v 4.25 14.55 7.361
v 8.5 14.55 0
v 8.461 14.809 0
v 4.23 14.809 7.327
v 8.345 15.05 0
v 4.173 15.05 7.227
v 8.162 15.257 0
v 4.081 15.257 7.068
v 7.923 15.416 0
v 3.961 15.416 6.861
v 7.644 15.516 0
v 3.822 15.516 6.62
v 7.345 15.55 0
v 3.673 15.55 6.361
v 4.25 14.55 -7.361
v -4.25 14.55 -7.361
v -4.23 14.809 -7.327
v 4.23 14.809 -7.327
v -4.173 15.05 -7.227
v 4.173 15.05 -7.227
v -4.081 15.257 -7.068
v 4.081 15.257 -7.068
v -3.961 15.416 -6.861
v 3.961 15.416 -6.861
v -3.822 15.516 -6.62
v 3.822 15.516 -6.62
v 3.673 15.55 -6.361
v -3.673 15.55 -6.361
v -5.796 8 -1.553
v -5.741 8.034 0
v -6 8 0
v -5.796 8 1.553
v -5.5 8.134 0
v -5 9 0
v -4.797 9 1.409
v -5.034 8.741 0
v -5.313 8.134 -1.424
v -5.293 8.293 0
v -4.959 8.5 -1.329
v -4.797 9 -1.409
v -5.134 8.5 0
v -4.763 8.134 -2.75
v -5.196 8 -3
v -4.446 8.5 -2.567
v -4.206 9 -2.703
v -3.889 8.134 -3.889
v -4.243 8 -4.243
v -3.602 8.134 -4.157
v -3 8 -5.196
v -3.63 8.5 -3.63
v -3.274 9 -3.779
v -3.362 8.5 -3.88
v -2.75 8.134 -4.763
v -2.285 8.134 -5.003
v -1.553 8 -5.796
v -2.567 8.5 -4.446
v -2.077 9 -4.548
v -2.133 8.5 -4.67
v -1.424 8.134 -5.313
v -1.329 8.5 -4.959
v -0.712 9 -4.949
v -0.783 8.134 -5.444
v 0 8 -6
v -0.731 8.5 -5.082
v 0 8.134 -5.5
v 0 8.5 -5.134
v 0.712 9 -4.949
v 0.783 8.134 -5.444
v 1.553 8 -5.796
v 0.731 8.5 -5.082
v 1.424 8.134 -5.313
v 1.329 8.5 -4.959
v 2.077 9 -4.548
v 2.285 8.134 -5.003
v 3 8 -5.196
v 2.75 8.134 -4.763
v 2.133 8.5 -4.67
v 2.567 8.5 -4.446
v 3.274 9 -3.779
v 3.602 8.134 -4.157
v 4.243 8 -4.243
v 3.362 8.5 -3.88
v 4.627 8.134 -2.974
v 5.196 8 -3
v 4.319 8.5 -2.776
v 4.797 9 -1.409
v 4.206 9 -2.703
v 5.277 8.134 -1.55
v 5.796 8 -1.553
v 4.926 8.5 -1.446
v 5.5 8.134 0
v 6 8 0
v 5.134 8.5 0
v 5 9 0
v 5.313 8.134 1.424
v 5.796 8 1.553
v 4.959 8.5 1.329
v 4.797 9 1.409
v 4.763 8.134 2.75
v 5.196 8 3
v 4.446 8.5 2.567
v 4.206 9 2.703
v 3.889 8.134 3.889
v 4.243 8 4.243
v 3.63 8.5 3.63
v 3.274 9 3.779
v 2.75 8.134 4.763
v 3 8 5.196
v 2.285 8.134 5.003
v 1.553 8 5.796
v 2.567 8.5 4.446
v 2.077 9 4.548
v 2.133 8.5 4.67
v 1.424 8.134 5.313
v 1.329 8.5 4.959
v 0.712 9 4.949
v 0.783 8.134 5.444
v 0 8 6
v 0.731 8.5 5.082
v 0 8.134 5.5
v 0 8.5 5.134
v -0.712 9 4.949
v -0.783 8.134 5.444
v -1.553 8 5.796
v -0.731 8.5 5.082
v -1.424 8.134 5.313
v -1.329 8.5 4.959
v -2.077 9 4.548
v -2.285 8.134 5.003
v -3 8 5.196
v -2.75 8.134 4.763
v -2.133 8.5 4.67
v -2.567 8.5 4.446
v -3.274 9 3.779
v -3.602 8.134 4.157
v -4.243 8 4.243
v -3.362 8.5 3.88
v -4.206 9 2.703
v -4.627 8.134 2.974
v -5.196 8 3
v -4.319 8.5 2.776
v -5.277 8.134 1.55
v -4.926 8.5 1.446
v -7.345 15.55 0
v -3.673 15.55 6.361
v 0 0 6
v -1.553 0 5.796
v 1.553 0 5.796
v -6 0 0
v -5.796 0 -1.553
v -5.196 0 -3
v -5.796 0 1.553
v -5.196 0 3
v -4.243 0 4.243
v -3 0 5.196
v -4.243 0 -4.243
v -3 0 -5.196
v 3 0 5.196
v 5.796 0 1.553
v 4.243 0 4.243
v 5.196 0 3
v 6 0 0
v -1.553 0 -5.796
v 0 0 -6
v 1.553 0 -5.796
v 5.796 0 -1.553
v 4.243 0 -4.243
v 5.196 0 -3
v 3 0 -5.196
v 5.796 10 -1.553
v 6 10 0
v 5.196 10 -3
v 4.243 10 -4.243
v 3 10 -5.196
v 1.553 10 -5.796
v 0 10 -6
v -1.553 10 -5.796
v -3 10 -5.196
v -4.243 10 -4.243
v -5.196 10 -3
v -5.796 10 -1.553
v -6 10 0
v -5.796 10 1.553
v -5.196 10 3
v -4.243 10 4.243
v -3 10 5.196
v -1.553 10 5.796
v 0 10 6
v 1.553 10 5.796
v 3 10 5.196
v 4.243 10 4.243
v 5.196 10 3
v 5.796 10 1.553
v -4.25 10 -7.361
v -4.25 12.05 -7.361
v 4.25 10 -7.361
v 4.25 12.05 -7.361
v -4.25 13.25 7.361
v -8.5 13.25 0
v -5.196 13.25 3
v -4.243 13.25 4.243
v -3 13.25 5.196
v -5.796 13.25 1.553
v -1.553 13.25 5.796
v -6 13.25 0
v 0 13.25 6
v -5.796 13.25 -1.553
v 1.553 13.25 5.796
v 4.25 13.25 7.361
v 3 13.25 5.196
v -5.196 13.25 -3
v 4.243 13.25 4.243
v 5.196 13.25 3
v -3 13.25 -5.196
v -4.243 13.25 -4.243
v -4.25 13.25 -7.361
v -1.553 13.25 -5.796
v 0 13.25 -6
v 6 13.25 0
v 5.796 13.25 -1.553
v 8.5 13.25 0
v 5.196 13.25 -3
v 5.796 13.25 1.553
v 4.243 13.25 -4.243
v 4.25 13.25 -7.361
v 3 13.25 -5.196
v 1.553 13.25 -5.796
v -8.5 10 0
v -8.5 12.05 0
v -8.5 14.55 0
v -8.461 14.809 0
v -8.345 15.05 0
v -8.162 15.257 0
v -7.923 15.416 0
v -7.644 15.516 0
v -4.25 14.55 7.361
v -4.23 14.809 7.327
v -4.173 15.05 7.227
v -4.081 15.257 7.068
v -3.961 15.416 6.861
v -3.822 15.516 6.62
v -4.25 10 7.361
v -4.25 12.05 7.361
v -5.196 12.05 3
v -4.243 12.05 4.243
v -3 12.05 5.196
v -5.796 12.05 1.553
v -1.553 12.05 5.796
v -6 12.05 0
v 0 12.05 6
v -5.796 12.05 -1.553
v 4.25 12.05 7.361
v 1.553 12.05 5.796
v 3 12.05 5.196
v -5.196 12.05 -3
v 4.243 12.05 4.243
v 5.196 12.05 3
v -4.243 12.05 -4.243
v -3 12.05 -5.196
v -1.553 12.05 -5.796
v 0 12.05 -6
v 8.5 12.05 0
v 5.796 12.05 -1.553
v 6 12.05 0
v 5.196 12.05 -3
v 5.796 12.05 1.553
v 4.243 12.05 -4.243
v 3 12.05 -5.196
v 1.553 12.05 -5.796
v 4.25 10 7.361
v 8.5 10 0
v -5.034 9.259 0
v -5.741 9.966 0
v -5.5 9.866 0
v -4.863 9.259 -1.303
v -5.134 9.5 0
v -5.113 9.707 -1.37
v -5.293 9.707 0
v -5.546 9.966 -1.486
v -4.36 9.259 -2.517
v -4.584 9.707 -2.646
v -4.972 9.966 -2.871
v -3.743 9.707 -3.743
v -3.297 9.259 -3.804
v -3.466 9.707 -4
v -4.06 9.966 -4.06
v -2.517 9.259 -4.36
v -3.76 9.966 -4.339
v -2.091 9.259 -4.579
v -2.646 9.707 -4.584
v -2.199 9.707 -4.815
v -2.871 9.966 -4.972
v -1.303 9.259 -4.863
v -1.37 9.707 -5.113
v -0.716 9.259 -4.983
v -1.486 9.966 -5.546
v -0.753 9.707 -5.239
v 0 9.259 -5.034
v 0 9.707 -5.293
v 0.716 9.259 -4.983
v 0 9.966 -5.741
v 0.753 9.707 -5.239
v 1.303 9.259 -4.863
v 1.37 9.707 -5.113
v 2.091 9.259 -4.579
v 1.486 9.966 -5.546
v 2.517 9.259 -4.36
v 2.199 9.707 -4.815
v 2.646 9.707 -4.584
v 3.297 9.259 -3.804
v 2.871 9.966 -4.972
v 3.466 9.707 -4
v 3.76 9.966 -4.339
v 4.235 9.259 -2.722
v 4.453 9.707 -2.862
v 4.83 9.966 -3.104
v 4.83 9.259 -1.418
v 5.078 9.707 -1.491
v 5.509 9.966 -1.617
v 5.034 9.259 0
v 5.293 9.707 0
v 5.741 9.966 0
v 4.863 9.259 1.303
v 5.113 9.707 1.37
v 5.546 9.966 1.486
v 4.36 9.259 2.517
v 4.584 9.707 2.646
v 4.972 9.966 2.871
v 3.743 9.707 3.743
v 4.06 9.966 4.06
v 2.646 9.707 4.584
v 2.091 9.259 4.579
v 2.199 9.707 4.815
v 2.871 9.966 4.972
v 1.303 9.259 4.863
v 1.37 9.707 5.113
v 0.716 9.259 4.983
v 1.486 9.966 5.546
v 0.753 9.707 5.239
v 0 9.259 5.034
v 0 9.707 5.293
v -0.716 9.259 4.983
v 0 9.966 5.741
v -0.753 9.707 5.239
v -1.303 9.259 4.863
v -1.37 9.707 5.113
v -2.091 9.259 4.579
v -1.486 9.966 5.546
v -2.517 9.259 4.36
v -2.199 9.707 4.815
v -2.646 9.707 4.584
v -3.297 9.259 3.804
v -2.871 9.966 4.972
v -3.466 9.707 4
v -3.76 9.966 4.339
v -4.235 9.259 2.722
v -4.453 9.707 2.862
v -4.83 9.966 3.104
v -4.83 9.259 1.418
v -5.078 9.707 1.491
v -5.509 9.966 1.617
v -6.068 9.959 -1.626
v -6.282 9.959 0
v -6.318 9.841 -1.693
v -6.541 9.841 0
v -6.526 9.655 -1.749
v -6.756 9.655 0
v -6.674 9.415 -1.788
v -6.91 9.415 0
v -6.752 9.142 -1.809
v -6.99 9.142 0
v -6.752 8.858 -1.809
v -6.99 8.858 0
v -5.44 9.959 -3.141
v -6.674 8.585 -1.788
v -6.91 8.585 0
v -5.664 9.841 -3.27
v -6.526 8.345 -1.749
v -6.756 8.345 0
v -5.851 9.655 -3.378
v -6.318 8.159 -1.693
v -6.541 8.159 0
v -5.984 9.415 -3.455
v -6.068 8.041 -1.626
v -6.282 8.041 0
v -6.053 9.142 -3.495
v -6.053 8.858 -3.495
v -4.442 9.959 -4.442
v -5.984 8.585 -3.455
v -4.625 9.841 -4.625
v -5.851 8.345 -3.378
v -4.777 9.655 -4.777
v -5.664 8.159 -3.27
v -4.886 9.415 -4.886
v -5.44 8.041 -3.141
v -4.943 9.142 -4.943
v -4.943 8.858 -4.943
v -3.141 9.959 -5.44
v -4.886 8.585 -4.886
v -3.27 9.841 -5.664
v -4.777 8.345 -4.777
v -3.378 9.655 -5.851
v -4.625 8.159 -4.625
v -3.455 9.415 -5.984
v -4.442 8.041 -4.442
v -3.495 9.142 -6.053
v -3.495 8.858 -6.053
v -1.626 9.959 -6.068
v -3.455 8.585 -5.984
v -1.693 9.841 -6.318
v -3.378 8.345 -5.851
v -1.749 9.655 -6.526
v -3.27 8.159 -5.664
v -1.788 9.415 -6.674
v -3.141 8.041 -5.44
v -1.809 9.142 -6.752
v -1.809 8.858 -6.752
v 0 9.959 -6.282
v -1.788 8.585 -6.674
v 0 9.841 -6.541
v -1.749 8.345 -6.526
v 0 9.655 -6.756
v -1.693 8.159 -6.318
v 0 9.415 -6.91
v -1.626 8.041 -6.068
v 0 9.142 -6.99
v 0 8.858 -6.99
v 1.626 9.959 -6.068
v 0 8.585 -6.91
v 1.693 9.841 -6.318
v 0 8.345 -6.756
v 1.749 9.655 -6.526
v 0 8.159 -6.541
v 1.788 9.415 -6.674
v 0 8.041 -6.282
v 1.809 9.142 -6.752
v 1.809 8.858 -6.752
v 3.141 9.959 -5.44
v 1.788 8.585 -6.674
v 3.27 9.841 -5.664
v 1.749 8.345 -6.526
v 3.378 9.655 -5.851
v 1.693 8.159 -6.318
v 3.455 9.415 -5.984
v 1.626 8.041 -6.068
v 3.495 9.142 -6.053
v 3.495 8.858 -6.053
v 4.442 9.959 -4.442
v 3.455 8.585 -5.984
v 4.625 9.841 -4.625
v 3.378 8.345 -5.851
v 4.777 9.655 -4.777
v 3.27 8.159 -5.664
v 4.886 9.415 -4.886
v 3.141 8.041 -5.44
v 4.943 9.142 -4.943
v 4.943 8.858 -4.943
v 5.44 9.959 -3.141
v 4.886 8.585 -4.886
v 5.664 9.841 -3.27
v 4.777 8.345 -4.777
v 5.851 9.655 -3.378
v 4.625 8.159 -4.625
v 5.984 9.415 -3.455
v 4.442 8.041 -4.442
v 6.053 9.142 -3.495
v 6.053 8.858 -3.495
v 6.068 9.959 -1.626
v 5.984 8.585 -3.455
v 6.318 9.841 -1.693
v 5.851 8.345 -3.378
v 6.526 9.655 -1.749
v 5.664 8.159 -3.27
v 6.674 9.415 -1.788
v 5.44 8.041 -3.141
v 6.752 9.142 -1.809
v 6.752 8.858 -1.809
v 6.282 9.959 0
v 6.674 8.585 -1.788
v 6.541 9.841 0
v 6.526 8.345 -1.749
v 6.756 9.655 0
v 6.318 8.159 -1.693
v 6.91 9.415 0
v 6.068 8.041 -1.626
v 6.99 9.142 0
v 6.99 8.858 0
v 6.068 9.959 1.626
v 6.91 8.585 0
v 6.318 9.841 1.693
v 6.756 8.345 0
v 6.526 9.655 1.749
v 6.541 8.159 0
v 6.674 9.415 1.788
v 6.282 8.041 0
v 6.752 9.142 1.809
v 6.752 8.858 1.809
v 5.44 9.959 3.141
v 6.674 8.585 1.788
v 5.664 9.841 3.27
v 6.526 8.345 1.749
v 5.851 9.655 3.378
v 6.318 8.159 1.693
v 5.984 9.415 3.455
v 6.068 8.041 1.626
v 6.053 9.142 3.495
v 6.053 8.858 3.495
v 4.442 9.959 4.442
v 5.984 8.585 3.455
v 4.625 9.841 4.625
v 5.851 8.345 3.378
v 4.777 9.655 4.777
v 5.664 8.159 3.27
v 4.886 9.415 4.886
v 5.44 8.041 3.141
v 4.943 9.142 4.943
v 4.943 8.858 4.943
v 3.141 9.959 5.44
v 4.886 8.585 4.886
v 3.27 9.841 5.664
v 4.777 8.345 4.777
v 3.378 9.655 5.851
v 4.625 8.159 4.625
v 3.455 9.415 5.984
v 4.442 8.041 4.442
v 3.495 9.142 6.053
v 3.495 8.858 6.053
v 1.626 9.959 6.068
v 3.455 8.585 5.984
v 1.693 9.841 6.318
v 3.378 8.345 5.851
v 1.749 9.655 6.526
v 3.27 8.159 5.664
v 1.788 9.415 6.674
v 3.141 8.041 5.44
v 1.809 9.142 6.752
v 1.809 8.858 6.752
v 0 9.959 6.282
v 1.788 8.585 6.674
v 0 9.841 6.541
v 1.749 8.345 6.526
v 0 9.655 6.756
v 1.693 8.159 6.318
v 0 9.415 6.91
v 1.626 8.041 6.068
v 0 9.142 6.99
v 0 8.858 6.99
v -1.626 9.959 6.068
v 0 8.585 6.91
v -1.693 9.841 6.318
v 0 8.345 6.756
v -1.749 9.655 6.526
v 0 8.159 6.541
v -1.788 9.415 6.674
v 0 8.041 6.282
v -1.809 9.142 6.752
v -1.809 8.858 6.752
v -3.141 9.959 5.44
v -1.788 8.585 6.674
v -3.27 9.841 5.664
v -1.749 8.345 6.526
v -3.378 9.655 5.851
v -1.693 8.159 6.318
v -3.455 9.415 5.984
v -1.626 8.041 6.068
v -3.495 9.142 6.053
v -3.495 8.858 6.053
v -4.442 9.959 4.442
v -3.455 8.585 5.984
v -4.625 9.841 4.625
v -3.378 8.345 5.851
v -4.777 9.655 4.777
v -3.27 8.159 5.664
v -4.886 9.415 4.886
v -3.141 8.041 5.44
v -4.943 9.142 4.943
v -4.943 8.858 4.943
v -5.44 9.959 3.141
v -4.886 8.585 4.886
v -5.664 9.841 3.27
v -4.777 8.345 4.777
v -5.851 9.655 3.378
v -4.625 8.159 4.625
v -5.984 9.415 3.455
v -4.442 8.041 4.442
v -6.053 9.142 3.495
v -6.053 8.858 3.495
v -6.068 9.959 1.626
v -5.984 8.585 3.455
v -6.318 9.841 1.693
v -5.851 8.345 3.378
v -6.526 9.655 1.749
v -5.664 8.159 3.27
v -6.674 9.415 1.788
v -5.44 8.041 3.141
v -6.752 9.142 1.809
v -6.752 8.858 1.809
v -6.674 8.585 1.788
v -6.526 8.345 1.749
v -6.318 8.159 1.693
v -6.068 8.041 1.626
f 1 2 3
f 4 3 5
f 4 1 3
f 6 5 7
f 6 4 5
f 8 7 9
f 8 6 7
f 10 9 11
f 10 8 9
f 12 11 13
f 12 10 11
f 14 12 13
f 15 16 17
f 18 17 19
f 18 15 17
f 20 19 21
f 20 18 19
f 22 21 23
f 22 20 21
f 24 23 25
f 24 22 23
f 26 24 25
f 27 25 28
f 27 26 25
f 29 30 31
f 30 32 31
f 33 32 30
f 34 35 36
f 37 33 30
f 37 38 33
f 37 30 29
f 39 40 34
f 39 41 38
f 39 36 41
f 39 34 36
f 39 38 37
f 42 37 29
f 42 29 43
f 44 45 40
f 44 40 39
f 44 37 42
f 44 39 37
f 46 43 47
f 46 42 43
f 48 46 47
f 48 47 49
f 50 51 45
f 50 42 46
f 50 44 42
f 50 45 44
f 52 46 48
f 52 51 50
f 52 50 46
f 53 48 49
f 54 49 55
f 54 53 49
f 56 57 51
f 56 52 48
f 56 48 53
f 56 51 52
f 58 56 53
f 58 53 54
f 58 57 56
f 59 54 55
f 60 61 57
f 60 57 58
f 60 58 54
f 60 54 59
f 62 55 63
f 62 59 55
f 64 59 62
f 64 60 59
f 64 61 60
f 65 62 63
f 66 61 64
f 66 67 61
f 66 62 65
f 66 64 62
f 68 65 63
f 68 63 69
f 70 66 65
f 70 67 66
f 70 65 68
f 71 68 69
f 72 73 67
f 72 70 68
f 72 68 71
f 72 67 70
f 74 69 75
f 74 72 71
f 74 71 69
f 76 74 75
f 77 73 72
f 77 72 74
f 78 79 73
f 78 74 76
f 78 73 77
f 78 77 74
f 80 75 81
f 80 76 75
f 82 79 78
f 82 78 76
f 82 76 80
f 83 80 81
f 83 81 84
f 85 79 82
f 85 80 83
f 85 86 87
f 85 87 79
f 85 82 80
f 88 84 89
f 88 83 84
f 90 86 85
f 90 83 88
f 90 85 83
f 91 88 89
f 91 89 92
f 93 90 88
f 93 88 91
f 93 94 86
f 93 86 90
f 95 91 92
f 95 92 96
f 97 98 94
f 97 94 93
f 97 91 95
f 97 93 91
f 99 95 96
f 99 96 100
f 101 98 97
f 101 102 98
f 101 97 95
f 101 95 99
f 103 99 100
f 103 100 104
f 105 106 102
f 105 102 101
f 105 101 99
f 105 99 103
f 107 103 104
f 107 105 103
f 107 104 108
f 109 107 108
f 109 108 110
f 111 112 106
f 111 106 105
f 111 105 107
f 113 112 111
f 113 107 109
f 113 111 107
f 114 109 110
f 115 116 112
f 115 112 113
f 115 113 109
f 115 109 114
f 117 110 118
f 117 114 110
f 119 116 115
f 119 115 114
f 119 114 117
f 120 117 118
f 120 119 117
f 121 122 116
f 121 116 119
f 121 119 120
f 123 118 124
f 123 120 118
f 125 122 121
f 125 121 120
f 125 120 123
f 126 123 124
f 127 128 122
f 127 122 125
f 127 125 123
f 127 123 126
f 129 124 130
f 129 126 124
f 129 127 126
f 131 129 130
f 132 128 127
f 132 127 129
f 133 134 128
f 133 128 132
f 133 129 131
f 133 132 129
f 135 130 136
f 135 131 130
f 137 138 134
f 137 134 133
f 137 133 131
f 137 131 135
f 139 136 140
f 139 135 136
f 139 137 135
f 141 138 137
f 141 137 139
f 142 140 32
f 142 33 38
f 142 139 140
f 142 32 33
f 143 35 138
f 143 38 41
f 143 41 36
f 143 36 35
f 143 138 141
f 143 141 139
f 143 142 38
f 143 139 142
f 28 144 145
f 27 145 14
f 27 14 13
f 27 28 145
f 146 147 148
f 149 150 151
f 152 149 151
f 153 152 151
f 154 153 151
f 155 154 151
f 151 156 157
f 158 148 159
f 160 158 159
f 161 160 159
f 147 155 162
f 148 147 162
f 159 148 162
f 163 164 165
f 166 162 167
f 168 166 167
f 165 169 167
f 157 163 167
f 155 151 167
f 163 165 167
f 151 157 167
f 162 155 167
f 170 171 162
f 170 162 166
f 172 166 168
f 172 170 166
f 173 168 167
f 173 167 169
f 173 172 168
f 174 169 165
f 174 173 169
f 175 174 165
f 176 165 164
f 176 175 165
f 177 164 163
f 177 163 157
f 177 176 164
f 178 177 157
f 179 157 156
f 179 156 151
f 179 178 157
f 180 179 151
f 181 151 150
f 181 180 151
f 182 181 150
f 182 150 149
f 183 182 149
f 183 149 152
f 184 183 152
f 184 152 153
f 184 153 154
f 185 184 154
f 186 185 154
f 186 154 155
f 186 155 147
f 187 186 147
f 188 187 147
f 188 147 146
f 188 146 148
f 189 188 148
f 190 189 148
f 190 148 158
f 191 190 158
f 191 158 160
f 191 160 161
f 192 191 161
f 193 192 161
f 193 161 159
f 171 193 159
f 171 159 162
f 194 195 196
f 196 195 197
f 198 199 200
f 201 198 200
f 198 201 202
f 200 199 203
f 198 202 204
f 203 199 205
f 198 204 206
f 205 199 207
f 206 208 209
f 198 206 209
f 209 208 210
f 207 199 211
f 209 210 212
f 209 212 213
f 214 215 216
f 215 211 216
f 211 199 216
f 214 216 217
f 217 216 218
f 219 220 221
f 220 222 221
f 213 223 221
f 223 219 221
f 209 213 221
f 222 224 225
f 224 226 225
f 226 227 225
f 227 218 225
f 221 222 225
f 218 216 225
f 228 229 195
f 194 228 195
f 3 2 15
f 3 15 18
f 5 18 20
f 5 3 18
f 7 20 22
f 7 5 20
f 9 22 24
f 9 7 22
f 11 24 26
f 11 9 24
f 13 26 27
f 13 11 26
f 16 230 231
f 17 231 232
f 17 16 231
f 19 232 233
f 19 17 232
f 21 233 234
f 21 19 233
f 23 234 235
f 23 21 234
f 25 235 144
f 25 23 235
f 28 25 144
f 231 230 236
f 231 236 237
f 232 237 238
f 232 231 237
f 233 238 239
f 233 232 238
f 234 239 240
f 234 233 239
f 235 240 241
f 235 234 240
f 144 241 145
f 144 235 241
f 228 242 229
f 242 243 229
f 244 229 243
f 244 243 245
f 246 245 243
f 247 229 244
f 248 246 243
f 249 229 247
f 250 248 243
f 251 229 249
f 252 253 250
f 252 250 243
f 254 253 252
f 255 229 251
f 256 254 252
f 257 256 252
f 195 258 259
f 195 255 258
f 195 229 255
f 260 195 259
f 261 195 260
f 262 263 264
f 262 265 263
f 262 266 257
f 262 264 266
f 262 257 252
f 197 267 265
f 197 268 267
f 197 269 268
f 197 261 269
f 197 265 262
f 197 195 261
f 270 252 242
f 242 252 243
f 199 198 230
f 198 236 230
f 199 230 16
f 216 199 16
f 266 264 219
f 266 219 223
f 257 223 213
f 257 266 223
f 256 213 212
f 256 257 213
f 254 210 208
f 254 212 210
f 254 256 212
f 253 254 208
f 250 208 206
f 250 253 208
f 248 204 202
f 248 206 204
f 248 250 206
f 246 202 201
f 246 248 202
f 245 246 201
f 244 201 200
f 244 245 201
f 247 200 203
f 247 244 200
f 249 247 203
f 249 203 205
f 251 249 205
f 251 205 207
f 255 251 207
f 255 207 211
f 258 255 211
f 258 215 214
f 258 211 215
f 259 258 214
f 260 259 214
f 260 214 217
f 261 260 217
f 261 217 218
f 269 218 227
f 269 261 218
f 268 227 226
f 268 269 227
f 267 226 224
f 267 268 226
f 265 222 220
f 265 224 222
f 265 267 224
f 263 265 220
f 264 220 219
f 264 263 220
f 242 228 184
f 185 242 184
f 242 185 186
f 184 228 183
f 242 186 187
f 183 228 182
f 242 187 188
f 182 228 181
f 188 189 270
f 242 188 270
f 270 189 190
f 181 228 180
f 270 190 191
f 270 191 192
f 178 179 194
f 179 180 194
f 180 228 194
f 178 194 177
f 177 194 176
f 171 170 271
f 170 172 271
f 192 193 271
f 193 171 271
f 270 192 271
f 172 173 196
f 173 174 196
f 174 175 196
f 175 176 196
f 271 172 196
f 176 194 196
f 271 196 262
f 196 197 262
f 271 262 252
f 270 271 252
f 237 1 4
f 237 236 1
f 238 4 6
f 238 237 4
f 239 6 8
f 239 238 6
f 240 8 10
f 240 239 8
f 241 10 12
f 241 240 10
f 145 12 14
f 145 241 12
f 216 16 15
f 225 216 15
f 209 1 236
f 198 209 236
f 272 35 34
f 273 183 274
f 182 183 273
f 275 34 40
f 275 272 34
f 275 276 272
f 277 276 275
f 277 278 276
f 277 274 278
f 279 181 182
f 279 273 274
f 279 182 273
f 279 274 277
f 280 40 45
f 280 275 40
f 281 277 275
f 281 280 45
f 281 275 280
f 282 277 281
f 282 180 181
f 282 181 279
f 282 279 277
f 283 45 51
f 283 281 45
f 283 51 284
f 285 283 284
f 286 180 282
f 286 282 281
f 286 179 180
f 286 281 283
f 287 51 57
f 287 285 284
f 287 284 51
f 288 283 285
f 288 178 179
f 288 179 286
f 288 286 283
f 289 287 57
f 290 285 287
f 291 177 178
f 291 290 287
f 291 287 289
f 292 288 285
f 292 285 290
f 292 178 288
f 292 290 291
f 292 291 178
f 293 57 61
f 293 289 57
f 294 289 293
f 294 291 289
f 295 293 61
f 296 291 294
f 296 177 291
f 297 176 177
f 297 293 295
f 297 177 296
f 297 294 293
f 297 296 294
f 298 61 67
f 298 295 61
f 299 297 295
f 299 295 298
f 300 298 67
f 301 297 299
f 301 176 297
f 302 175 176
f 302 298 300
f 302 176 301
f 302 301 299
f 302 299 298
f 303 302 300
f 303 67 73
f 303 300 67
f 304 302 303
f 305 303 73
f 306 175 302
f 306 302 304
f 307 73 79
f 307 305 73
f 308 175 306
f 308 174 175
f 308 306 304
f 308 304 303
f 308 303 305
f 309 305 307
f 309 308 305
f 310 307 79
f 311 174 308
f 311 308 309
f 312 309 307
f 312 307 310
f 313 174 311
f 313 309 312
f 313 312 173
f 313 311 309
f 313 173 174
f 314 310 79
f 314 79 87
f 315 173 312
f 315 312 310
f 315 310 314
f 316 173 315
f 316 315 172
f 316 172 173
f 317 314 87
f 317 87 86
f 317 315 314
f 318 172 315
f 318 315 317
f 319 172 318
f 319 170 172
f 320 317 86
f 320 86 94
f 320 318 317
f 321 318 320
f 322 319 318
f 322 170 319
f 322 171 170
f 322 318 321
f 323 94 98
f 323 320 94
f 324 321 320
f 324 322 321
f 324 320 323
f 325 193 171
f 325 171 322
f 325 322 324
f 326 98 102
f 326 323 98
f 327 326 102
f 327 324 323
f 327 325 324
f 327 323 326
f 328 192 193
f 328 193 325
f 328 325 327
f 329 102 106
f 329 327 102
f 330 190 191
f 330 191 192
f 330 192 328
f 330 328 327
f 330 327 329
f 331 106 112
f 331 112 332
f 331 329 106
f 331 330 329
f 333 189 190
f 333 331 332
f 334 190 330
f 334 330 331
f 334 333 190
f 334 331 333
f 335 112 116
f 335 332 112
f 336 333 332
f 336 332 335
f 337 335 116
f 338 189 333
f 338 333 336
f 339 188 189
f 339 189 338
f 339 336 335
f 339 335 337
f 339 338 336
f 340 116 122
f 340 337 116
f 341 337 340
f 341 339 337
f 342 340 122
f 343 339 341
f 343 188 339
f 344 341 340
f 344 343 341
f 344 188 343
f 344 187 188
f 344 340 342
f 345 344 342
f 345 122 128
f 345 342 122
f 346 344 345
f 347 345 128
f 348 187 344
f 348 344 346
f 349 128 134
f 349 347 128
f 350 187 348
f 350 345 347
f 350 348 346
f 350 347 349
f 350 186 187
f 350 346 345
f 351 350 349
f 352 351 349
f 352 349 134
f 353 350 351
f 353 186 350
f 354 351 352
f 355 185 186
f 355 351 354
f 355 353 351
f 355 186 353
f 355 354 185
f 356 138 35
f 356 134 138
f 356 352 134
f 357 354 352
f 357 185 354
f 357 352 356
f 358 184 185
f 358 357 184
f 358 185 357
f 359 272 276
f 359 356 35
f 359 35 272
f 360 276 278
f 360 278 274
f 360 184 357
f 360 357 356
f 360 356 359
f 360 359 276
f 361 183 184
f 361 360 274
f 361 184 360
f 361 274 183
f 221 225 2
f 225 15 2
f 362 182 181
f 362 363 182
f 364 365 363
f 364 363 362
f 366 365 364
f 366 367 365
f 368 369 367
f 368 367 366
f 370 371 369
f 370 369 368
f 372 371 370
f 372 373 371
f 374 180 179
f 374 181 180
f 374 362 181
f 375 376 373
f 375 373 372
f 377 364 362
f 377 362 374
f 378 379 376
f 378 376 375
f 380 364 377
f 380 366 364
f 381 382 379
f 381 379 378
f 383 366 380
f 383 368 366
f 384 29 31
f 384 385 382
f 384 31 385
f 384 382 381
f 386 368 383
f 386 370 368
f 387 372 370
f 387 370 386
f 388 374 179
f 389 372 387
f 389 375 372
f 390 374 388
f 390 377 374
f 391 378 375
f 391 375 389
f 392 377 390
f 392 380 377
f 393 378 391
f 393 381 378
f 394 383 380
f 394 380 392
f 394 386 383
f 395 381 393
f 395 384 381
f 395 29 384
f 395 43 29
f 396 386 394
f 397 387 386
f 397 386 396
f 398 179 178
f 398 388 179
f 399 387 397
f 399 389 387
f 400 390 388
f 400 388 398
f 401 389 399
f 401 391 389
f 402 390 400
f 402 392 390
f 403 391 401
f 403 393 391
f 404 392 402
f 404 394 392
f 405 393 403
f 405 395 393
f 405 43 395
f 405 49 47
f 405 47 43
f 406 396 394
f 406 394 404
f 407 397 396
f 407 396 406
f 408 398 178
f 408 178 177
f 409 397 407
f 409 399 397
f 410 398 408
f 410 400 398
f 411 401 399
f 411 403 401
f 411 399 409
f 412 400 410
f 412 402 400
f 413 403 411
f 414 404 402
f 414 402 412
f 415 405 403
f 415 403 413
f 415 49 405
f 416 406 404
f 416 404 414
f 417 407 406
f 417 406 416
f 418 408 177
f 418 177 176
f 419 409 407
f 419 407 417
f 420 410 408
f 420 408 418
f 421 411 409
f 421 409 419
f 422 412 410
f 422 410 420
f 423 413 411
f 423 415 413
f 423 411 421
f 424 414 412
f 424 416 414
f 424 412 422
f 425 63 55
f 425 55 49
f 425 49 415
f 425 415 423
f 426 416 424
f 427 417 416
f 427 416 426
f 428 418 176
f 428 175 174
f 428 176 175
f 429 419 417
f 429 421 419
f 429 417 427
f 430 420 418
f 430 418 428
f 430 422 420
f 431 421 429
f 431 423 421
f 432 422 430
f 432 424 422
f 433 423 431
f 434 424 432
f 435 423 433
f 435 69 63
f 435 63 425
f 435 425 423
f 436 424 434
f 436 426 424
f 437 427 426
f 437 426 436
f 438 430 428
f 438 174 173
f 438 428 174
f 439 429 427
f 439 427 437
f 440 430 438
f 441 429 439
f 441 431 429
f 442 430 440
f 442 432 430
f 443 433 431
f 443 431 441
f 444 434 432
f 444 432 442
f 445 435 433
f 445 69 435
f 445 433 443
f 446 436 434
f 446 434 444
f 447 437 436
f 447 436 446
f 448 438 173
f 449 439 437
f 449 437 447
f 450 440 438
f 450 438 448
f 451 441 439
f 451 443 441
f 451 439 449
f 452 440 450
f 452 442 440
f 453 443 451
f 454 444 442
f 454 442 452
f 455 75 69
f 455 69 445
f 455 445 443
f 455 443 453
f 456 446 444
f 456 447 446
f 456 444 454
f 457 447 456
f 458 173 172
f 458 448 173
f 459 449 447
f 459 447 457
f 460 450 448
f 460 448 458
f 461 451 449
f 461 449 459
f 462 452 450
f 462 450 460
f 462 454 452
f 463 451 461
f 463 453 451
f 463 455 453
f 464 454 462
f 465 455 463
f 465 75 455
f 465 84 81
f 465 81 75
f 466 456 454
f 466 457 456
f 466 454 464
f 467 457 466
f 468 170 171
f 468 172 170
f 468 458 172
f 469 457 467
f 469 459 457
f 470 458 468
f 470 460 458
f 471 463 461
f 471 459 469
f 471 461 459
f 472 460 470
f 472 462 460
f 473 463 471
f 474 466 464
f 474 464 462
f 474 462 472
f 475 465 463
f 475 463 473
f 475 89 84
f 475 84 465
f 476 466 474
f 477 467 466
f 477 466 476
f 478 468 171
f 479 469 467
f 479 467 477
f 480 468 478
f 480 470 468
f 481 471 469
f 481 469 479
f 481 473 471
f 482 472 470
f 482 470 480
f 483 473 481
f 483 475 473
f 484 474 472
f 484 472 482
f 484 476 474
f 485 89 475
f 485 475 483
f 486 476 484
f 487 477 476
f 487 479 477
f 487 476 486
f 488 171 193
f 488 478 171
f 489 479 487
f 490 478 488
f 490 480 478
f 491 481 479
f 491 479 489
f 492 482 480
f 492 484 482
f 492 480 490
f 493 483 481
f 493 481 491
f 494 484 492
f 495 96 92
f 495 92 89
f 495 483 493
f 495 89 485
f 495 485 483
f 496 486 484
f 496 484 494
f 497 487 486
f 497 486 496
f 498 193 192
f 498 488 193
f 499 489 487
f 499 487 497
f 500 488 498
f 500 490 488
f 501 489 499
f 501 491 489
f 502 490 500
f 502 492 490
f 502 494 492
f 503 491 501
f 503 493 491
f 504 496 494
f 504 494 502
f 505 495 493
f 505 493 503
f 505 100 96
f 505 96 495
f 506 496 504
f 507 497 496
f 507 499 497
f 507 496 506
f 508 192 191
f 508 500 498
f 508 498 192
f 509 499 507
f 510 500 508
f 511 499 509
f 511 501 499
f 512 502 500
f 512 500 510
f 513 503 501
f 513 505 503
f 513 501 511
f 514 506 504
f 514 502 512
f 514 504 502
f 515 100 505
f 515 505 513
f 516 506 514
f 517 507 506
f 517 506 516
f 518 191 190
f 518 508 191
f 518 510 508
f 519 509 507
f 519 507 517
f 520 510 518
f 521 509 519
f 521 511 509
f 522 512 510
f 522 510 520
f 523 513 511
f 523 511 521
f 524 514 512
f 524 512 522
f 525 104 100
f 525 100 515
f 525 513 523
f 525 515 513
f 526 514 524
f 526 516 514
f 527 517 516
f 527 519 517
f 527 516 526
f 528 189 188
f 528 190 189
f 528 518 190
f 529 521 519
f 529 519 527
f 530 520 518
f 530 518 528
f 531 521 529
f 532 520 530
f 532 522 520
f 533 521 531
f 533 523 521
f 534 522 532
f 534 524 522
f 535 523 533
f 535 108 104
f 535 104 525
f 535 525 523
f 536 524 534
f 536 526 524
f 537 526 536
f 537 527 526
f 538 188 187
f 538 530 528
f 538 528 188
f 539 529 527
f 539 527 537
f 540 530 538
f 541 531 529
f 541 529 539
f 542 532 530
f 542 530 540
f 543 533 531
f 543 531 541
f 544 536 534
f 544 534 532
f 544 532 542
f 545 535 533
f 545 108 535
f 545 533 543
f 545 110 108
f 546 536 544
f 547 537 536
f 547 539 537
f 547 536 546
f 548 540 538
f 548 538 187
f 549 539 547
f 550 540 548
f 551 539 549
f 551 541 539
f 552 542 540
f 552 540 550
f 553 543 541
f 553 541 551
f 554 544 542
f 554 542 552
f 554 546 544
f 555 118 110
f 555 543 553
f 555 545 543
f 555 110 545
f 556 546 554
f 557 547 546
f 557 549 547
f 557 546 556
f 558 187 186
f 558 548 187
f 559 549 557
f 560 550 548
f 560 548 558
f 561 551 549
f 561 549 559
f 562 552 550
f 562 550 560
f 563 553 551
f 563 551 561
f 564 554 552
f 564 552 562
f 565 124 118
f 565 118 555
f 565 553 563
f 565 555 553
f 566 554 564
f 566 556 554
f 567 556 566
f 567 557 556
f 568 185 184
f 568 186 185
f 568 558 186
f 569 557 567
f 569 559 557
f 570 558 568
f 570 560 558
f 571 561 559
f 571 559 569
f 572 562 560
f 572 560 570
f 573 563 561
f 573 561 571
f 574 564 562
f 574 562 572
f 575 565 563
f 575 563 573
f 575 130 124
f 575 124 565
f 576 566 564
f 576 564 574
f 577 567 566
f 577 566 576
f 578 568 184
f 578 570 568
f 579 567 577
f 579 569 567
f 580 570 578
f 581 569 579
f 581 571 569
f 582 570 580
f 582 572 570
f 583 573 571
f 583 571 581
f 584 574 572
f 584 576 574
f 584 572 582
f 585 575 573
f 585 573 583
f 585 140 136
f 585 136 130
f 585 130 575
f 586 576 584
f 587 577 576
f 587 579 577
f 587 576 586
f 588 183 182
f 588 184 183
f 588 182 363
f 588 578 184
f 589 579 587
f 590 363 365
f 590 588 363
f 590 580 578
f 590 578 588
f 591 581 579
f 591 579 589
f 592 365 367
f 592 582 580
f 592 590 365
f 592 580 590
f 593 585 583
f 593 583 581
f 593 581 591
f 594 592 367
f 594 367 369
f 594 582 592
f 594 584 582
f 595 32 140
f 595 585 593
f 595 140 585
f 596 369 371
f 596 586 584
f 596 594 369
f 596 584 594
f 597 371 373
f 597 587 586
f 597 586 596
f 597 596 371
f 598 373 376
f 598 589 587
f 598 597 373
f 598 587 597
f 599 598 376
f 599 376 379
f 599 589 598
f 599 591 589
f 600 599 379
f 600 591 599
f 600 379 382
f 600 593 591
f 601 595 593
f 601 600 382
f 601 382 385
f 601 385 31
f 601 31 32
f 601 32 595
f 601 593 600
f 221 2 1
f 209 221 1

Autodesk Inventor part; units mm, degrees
ref_plane "YZ Plane" through (0, 0, 0) normal (1, 0, 0) x (0, 1, 0)
ref_plane "XZ Plane" through (0, 0, 0) normal (0, 1, 0) x (-1, 0, 0)
sketch "Sketch1" plane through (0, 0, 0) normal (0, 0, 1) x (1, 0, 0)
  line L0 (0, 0) -> (6, 0)
  line L1 (6, 0) -> (6, 10)
  line L2 (6, 10) -> (8.5, 10)
  line L3 (8.5, 10) -> (8.5, 15.55)
  line L4 (8.5, 15.55) -> (0, 15.55)
  line L5 (0, 15.55) -> (0, 0)
  line L6 (0, -3.11) -> (0, 18.66) projected
  dimension "d0" = 10
  dimension "d1" = 5.55
  dimension "d2" = 8.5
  dimension "d3" = 6
revolve "Revolution1" add sketch "Sketch1" angle 360 about axis through (0, -10, 0) along (0, 1, 0)
thread "Thread1" size "M12x1.5" class "6g" standard "ANSI Metric M Profile" full length
sketch "Sketch2" plane through (0, 0, 0) normal (0, 0, 1) x (1, 0, 0)
  line L0 (-8.5, 10) -> (8.5, 10) projected
  line L1 (-6, 10) -> (-6, 0) projected
  circle A0 centre (-6, 9) radius 1
  line L2 (0, -3.11) -> (0, 18.66) projected
  point P0 (0, 0)
  dimension "d8" = 2
revolve "Revolution2" add sketch "Sketch2" angle 360 about axis through (0, -10, 0) along (0, 1, 0) separate body
sketch "Sketch3" plane through (0, 15.55, 0) normal (0, 1, 0) x (1, 0, 0)
  circle A0 centre (0, 0) radius 8.5 projected
  line L0 (-8.5, 0) -> (-4.25, 7.3612)
  line L1 (-4.25, 7.3612) -> (4.25, 7.3612)
  line L2 (4.25, 7.3612) -> (8.5, 0)
  line L3 (8.5, 0) -> (4.25, -7.3612)
  line L4 (4.25, -7.3612) -> (-4.25, -7.3612)
  line L5 (-4.25, -7.3612) -> (-8.5, 0)
extrude "Extrusion1" cut sketch "Sketch3" against normal blind 10 contours L2 A0 | A0 L3 | L1 A0 | A0 L4 | L0 A0 | A0 L5 bodies 1
ref_plane "Work Plane1" through (-4.25, 12.05, 7.3612) normal (0, 1, 0) x (1, 0, 0)
sketch "Sketch4" plane through (-4.25, 12.05, 7.3612) normal (0, 1, 0) x (1, 0, 0)
  circle A0 centre (4.25, 7.3612) radius 6
  line L0 (0, 0) -> (8.5, 0) projected
  line L1 (-4.25, 7.3612) -> (0, 0) projected
  line L2 (0, 0) -> (8.5, 0) projected
  line L3 (8.5, 0) -> (12.75, 7.3612) projected
  line L4 (12.75, 7.3612) -> (8.5, 14.7224) projected
  line L5 (8.5, 14.7224) -> (0, 14.7224) projected
  line L6 (0, 14.7224) -> (-4.25, 7.3612) projected
extrude "Extrusion2" cut sketch "Sketch4" along normal blind 1.2 bodies 1
fillet "Fillet2" radius 1 6 edges at (0, 15.55, -7.3612) (-6.375, 15.55, -3.6806) (-6.375, 15.55, 3.6806) (0, 15.55, 7.3612) (6.375, 15.55, 3.6806) (6.375, 15.55, -3.6806)
properties part number "PMF100585"
